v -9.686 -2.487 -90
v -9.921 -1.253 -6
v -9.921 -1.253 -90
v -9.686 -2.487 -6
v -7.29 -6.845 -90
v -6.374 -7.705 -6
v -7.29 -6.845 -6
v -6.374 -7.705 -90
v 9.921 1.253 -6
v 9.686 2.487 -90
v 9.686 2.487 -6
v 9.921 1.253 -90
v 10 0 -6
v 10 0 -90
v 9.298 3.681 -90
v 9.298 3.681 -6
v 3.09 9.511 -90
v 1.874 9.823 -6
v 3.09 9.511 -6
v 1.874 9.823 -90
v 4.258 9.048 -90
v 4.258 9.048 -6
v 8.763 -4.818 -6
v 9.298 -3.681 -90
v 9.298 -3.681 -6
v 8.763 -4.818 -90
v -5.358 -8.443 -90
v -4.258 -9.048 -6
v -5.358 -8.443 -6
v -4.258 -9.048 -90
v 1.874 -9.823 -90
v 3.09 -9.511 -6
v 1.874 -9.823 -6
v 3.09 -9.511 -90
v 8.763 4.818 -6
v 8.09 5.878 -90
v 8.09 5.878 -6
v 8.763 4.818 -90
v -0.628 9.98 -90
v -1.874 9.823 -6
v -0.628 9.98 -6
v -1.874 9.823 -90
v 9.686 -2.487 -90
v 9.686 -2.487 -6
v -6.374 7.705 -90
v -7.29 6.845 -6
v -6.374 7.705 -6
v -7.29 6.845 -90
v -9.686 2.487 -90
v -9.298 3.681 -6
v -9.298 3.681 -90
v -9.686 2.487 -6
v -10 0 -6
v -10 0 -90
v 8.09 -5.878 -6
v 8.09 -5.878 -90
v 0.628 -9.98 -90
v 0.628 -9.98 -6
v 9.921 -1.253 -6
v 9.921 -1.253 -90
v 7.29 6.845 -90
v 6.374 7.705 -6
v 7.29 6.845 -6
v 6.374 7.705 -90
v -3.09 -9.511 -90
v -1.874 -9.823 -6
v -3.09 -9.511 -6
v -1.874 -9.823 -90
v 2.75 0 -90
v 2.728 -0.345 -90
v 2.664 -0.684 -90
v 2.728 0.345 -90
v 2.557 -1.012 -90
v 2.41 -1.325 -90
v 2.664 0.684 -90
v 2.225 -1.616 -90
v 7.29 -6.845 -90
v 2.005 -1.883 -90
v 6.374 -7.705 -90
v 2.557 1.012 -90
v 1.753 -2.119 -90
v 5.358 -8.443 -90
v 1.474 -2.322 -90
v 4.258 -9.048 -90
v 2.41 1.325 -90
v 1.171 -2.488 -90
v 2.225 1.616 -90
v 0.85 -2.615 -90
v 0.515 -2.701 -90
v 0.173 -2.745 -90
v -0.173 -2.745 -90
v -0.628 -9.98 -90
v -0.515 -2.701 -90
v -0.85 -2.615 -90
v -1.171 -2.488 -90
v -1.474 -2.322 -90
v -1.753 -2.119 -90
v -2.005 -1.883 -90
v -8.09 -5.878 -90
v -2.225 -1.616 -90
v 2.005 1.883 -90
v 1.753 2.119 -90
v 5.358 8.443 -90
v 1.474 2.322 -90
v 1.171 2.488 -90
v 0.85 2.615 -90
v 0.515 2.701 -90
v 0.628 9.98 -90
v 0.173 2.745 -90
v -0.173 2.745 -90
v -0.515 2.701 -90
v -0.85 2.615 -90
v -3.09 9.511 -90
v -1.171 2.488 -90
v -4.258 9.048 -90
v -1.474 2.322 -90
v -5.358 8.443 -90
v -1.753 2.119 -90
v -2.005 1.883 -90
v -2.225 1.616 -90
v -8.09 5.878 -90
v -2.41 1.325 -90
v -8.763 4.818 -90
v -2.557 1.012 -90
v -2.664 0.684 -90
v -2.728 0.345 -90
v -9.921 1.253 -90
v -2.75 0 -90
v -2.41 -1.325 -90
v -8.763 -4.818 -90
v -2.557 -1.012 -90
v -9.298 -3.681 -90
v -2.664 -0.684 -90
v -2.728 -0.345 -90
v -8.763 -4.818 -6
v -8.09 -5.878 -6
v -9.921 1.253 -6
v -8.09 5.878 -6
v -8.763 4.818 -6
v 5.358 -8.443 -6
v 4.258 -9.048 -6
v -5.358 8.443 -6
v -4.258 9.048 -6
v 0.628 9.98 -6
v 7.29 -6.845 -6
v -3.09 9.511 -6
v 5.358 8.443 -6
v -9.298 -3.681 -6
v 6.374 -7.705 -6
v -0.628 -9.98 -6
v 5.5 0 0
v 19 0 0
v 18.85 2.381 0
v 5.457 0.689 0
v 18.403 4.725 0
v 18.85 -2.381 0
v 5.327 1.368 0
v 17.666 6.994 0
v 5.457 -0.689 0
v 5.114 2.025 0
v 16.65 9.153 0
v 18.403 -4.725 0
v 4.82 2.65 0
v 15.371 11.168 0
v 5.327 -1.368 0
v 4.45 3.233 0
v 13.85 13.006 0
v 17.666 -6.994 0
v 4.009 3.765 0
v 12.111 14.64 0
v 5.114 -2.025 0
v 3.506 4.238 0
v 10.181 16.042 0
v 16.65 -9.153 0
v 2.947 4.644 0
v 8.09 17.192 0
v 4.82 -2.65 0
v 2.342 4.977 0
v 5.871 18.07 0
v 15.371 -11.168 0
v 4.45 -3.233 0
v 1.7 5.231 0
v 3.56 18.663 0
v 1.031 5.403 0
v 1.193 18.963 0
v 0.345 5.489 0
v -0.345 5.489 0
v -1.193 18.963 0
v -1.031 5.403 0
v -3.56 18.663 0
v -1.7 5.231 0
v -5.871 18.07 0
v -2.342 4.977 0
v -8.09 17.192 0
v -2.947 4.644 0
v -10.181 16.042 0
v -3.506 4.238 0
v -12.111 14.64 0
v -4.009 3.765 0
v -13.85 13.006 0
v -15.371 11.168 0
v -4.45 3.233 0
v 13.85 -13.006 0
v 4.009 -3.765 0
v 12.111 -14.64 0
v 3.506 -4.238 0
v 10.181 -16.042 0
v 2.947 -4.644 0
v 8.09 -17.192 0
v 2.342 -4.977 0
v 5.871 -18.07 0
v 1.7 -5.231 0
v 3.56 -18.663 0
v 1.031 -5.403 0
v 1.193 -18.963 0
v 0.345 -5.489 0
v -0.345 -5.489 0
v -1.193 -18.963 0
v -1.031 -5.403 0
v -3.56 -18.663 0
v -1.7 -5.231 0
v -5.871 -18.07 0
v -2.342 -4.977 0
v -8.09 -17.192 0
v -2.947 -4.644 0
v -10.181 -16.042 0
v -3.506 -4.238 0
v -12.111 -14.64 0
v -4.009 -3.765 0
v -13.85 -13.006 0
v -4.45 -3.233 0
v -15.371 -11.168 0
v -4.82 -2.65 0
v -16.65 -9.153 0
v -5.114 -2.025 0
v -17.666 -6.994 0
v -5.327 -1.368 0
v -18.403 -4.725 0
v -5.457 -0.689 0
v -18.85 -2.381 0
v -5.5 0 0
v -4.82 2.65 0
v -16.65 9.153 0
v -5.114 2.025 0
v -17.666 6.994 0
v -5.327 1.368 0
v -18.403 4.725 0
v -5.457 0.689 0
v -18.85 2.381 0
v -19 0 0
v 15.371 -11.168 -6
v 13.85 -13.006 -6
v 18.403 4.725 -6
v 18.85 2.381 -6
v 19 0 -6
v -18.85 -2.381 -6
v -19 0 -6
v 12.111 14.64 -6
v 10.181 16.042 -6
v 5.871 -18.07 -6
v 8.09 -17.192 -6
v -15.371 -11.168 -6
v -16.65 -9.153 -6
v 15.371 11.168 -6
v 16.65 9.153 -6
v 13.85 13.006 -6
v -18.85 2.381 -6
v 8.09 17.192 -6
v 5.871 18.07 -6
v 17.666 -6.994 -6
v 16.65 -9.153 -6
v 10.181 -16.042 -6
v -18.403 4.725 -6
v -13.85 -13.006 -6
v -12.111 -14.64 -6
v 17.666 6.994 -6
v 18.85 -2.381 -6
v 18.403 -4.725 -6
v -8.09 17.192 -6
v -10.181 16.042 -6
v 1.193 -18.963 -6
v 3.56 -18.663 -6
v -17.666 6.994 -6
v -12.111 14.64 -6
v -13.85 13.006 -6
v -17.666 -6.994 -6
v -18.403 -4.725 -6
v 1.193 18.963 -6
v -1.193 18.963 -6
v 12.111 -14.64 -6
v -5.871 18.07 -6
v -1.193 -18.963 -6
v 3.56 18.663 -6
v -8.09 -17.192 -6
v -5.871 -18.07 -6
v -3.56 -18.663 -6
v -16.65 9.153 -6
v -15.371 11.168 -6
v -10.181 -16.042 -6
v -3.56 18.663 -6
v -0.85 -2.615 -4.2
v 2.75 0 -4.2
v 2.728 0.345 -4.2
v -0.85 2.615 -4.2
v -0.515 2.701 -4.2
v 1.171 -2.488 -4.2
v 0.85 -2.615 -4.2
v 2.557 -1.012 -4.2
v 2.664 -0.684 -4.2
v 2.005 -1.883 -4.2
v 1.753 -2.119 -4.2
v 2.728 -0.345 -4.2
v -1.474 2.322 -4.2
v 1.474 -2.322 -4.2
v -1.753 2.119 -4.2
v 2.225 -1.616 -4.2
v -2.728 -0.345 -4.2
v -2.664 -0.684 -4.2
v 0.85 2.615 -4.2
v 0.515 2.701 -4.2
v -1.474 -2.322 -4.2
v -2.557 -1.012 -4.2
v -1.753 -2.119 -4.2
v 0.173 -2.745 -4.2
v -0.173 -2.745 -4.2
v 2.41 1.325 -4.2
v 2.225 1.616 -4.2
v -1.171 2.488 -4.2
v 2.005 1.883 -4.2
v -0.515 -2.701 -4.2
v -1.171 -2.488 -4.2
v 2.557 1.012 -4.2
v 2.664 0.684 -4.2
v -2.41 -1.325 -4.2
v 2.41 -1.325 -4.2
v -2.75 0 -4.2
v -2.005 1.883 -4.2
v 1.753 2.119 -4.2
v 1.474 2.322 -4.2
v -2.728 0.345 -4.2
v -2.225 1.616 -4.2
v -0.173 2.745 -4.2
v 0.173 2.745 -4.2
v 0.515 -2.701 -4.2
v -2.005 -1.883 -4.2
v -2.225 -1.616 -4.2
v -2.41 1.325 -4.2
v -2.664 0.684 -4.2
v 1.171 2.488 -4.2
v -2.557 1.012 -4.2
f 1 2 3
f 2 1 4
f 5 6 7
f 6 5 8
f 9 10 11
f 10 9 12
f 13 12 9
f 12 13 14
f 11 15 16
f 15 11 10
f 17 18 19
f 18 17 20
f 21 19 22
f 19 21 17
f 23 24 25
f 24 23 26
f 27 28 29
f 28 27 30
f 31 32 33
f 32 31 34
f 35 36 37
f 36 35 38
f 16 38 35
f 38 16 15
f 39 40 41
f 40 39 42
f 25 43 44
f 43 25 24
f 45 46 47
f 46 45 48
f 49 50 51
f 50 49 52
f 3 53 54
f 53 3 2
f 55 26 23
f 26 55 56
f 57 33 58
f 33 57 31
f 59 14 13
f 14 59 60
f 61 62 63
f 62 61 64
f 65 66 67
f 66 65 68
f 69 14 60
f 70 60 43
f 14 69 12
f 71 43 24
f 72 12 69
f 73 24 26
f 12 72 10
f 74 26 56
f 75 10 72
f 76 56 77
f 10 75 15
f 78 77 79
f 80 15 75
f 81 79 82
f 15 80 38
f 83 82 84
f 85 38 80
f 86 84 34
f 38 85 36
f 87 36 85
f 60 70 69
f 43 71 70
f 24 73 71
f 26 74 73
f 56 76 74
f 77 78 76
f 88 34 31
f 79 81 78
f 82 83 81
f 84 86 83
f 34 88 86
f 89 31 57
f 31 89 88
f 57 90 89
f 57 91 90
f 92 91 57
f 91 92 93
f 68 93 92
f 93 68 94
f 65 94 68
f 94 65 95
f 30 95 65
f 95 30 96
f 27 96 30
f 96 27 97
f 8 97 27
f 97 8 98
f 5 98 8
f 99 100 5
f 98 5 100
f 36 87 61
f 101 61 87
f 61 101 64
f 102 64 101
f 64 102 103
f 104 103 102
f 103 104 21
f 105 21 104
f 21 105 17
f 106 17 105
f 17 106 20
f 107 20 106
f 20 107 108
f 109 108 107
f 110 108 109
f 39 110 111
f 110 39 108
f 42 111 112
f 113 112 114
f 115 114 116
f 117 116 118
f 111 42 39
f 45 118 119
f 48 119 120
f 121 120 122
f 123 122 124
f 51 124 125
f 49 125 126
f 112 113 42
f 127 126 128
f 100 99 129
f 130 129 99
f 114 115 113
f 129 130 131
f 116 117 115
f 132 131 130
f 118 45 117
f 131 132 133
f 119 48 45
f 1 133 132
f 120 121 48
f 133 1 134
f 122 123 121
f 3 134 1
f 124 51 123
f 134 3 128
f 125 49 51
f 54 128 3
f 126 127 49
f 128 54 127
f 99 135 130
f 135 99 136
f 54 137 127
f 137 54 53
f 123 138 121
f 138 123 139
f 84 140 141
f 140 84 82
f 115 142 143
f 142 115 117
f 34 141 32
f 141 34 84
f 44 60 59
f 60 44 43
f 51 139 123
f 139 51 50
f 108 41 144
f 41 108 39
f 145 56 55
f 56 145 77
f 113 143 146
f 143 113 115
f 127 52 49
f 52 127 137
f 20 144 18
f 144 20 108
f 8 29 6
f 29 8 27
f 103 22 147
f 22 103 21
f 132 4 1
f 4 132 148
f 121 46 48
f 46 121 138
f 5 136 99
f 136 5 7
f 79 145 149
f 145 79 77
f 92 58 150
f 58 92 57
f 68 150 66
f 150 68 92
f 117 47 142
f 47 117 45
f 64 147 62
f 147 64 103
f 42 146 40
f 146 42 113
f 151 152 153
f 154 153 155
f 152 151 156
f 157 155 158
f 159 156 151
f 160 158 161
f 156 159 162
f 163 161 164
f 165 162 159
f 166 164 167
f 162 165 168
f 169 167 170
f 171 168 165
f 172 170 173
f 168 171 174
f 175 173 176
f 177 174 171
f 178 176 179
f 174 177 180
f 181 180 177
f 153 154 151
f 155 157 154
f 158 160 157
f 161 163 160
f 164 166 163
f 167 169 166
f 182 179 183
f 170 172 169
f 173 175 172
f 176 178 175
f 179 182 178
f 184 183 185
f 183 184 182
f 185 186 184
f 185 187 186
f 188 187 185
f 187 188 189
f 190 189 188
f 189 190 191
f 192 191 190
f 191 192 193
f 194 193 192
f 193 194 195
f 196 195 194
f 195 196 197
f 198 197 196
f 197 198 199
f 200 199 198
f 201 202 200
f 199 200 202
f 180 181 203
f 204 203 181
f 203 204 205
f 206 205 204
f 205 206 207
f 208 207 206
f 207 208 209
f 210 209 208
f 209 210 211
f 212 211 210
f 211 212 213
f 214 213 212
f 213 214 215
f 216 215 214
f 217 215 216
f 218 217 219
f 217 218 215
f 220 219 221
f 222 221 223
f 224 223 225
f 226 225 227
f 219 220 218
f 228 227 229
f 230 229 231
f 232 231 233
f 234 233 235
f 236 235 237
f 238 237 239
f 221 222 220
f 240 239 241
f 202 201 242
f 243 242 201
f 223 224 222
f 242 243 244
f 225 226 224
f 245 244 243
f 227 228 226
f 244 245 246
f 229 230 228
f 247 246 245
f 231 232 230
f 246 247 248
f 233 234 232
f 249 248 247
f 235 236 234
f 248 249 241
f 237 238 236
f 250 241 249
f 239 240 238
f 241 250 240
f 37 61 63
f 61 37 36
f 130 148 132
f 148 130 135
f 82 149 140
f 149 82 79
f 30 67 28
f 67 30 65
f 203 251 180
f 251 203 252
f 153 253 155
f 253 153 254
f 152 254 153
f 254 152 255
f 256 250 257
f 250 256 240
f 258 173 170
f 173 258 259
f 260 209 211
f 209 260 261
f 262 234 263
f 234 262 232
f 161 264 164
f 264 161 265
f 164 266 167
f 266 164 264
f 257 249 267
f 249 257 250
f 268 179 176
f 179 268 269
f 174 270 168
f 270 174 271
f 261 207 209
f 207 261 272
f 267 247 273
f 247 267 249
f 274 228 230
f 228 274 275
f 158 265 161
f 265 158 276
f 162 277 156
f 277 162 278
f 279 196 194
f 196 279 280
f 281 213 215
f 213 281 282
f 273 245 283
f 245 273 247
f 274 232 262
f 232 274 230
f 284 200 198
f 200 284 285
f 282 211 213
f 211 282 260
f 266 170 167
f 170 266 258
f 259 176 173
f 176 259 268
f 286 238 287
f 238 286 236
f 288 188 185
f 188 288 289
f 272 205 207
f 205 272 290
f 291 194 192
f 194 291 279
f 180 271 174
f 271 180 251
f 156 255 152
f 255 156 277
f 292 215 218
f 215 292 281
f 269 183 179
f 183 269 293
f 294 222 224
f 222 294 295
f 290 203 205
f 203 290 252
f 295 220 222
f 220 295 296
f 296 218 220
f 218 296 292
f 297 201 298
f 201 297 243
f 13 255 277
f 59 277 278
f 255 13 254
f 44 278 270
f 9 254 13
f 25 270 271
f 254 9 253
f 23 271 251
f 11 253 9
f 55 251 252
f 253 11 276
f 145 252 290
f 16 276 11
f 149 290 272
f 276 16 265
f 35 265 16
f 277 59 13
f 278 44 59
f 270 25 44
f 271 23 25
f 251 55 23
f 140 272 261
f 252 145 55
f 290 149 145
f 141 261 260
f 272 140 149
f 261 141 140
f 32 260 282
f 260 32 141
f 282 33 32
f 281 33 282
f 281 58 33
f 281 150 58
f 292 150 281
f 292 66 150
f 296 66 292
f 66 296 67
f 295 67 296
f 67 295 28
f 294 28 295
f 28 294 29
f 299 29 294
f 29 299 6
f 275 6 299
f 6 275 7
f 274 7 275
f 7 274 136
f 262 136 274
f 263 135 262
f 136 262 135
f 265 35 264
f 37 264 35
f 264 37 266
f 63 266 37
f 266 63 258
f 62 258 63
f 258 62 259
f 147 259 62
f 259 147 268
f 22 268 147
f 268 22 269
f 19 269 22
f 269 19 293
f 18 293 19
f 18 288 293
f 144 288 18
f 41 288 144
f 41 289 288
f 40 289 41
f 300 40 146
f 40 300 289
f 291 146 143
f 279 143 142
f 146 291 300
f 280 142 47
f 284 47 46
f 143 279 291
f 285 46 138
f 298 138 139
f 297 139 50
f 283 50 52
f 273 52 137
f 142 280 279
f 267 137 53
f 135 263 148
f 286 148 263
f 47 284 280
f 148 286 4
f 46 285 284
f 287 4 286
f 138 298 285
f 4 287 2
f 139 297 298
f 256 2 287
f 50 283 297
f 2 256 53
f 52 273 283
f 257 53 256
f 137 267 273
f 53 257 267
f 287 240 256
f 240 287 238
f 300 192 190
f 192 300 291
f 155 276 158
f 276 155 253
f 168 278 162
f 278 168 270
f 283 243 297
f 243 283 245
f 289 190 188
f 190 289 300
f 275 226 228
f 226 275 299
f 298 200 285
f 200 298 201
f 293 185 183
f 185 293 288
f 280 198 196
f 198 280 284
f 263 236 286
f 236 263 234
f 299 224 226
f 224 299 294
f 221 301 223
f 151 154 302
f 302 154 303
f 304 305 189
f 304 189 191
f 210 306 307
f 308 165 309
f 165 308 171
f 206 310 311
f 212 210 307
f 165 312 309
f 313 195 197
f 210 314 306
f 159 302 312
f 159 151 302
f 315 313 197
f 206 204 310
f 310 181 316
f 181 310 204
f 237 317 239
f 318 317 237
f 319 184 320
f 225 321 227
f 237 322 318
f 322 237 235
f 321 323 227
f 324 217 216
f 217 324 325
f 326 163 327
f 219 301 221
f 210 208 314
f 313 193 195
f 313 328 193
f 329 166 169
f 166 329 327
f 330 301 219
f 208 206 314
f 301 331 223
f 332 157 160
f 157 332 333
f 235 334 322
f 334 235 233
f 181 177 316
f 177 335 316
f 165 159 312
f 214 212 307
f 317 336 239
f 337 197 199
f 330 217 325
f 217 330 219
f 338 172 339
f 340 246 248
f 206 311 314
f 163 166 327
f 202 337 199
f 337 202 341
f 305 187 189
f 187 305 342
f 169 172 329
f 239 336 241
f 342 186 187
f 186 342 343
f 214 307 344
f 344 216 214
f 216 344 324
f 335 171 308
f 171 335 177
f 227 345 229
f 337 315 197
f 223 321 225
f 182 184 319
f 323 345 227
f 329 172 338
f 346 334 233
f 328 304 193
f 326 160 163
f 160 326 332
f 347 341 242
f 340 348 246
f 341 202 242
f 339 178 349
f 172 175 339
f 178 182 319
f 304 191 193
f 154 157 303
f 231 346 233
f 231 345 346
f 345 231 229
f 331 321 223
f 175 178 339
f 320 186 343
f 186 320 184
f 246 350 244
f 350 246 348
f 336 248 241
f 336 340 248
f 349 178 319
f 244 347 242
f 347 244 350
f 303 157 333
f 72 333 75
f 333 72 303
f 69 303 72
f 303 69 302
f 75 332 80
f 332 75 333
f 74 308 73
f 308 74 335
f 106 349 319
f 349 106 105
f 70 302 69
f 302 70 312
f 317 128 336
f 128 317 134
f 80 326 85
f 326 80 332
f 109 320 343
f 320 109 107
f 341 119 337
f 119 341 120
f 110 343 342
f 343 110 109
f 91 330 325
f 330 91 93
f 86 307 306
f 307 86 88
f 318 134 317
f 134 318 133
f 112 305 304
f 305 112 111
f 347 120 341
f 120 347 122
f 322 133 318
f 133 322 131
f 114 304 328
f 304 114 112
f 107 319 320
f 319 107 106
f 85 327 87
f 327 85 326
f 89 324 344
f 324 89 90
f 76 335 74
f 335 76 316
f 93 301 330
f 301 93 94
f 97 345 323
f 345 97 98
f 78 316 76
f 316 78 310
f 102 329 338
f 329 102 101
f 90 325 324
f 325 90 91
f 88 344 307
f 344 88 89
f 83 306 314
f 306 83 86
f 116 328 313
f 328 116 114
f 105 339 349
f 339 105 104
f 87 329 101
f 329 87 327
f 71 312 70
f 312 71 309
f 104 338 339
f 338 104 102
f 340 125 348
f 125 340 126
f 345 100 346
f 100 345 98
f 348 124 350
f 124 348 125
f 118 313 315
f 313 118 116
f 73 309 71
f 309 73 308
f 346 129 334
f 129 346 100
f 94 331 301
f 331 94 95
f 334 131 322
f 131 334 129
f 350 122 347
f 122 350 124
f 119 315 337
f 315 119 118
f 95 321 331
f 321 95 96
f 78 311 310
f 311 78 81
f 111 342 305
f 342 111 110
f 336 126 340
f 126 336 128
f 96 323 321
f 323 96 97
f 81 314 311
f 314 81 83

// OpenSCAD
$fn = 50;


difference() {
	union() {
		translate(v = [0, 0, -90.0000000000]) {
			cylinder(h = 90, r = 10.0000000000);
		}
		translate(v = [0, 0, -6.0000000000]) {
			cylinder(h = 6, r = 19.0000000000);
		}
	}
	union() {
		translate(v = [0, 0, 0]) {
			rotate(a = [0, 0, 0]) {
				difference() {
					union() {
						#translate(v = [0, 0, -90.0000000000]) {
							cylinder(h = 90, r = 2.2500000000);
						}
						#translate(v = [0, 0, -4.2000000000]) {
							cylinder(h = 4.2000000000, r1 = 2.7500000000, r2 = 5.5000000000);
						}
						#translate(v = [0, 0, -90.0000000000]) {
							cylinder(h = 90, r = 2.7500000000);
						}
						#translate(v = [0, 0, -90.0000000000]) {
							cylinder(h = 90, r = 2.2500000000);
						}
					}
					union();
				}
			}
		}
	}
}
